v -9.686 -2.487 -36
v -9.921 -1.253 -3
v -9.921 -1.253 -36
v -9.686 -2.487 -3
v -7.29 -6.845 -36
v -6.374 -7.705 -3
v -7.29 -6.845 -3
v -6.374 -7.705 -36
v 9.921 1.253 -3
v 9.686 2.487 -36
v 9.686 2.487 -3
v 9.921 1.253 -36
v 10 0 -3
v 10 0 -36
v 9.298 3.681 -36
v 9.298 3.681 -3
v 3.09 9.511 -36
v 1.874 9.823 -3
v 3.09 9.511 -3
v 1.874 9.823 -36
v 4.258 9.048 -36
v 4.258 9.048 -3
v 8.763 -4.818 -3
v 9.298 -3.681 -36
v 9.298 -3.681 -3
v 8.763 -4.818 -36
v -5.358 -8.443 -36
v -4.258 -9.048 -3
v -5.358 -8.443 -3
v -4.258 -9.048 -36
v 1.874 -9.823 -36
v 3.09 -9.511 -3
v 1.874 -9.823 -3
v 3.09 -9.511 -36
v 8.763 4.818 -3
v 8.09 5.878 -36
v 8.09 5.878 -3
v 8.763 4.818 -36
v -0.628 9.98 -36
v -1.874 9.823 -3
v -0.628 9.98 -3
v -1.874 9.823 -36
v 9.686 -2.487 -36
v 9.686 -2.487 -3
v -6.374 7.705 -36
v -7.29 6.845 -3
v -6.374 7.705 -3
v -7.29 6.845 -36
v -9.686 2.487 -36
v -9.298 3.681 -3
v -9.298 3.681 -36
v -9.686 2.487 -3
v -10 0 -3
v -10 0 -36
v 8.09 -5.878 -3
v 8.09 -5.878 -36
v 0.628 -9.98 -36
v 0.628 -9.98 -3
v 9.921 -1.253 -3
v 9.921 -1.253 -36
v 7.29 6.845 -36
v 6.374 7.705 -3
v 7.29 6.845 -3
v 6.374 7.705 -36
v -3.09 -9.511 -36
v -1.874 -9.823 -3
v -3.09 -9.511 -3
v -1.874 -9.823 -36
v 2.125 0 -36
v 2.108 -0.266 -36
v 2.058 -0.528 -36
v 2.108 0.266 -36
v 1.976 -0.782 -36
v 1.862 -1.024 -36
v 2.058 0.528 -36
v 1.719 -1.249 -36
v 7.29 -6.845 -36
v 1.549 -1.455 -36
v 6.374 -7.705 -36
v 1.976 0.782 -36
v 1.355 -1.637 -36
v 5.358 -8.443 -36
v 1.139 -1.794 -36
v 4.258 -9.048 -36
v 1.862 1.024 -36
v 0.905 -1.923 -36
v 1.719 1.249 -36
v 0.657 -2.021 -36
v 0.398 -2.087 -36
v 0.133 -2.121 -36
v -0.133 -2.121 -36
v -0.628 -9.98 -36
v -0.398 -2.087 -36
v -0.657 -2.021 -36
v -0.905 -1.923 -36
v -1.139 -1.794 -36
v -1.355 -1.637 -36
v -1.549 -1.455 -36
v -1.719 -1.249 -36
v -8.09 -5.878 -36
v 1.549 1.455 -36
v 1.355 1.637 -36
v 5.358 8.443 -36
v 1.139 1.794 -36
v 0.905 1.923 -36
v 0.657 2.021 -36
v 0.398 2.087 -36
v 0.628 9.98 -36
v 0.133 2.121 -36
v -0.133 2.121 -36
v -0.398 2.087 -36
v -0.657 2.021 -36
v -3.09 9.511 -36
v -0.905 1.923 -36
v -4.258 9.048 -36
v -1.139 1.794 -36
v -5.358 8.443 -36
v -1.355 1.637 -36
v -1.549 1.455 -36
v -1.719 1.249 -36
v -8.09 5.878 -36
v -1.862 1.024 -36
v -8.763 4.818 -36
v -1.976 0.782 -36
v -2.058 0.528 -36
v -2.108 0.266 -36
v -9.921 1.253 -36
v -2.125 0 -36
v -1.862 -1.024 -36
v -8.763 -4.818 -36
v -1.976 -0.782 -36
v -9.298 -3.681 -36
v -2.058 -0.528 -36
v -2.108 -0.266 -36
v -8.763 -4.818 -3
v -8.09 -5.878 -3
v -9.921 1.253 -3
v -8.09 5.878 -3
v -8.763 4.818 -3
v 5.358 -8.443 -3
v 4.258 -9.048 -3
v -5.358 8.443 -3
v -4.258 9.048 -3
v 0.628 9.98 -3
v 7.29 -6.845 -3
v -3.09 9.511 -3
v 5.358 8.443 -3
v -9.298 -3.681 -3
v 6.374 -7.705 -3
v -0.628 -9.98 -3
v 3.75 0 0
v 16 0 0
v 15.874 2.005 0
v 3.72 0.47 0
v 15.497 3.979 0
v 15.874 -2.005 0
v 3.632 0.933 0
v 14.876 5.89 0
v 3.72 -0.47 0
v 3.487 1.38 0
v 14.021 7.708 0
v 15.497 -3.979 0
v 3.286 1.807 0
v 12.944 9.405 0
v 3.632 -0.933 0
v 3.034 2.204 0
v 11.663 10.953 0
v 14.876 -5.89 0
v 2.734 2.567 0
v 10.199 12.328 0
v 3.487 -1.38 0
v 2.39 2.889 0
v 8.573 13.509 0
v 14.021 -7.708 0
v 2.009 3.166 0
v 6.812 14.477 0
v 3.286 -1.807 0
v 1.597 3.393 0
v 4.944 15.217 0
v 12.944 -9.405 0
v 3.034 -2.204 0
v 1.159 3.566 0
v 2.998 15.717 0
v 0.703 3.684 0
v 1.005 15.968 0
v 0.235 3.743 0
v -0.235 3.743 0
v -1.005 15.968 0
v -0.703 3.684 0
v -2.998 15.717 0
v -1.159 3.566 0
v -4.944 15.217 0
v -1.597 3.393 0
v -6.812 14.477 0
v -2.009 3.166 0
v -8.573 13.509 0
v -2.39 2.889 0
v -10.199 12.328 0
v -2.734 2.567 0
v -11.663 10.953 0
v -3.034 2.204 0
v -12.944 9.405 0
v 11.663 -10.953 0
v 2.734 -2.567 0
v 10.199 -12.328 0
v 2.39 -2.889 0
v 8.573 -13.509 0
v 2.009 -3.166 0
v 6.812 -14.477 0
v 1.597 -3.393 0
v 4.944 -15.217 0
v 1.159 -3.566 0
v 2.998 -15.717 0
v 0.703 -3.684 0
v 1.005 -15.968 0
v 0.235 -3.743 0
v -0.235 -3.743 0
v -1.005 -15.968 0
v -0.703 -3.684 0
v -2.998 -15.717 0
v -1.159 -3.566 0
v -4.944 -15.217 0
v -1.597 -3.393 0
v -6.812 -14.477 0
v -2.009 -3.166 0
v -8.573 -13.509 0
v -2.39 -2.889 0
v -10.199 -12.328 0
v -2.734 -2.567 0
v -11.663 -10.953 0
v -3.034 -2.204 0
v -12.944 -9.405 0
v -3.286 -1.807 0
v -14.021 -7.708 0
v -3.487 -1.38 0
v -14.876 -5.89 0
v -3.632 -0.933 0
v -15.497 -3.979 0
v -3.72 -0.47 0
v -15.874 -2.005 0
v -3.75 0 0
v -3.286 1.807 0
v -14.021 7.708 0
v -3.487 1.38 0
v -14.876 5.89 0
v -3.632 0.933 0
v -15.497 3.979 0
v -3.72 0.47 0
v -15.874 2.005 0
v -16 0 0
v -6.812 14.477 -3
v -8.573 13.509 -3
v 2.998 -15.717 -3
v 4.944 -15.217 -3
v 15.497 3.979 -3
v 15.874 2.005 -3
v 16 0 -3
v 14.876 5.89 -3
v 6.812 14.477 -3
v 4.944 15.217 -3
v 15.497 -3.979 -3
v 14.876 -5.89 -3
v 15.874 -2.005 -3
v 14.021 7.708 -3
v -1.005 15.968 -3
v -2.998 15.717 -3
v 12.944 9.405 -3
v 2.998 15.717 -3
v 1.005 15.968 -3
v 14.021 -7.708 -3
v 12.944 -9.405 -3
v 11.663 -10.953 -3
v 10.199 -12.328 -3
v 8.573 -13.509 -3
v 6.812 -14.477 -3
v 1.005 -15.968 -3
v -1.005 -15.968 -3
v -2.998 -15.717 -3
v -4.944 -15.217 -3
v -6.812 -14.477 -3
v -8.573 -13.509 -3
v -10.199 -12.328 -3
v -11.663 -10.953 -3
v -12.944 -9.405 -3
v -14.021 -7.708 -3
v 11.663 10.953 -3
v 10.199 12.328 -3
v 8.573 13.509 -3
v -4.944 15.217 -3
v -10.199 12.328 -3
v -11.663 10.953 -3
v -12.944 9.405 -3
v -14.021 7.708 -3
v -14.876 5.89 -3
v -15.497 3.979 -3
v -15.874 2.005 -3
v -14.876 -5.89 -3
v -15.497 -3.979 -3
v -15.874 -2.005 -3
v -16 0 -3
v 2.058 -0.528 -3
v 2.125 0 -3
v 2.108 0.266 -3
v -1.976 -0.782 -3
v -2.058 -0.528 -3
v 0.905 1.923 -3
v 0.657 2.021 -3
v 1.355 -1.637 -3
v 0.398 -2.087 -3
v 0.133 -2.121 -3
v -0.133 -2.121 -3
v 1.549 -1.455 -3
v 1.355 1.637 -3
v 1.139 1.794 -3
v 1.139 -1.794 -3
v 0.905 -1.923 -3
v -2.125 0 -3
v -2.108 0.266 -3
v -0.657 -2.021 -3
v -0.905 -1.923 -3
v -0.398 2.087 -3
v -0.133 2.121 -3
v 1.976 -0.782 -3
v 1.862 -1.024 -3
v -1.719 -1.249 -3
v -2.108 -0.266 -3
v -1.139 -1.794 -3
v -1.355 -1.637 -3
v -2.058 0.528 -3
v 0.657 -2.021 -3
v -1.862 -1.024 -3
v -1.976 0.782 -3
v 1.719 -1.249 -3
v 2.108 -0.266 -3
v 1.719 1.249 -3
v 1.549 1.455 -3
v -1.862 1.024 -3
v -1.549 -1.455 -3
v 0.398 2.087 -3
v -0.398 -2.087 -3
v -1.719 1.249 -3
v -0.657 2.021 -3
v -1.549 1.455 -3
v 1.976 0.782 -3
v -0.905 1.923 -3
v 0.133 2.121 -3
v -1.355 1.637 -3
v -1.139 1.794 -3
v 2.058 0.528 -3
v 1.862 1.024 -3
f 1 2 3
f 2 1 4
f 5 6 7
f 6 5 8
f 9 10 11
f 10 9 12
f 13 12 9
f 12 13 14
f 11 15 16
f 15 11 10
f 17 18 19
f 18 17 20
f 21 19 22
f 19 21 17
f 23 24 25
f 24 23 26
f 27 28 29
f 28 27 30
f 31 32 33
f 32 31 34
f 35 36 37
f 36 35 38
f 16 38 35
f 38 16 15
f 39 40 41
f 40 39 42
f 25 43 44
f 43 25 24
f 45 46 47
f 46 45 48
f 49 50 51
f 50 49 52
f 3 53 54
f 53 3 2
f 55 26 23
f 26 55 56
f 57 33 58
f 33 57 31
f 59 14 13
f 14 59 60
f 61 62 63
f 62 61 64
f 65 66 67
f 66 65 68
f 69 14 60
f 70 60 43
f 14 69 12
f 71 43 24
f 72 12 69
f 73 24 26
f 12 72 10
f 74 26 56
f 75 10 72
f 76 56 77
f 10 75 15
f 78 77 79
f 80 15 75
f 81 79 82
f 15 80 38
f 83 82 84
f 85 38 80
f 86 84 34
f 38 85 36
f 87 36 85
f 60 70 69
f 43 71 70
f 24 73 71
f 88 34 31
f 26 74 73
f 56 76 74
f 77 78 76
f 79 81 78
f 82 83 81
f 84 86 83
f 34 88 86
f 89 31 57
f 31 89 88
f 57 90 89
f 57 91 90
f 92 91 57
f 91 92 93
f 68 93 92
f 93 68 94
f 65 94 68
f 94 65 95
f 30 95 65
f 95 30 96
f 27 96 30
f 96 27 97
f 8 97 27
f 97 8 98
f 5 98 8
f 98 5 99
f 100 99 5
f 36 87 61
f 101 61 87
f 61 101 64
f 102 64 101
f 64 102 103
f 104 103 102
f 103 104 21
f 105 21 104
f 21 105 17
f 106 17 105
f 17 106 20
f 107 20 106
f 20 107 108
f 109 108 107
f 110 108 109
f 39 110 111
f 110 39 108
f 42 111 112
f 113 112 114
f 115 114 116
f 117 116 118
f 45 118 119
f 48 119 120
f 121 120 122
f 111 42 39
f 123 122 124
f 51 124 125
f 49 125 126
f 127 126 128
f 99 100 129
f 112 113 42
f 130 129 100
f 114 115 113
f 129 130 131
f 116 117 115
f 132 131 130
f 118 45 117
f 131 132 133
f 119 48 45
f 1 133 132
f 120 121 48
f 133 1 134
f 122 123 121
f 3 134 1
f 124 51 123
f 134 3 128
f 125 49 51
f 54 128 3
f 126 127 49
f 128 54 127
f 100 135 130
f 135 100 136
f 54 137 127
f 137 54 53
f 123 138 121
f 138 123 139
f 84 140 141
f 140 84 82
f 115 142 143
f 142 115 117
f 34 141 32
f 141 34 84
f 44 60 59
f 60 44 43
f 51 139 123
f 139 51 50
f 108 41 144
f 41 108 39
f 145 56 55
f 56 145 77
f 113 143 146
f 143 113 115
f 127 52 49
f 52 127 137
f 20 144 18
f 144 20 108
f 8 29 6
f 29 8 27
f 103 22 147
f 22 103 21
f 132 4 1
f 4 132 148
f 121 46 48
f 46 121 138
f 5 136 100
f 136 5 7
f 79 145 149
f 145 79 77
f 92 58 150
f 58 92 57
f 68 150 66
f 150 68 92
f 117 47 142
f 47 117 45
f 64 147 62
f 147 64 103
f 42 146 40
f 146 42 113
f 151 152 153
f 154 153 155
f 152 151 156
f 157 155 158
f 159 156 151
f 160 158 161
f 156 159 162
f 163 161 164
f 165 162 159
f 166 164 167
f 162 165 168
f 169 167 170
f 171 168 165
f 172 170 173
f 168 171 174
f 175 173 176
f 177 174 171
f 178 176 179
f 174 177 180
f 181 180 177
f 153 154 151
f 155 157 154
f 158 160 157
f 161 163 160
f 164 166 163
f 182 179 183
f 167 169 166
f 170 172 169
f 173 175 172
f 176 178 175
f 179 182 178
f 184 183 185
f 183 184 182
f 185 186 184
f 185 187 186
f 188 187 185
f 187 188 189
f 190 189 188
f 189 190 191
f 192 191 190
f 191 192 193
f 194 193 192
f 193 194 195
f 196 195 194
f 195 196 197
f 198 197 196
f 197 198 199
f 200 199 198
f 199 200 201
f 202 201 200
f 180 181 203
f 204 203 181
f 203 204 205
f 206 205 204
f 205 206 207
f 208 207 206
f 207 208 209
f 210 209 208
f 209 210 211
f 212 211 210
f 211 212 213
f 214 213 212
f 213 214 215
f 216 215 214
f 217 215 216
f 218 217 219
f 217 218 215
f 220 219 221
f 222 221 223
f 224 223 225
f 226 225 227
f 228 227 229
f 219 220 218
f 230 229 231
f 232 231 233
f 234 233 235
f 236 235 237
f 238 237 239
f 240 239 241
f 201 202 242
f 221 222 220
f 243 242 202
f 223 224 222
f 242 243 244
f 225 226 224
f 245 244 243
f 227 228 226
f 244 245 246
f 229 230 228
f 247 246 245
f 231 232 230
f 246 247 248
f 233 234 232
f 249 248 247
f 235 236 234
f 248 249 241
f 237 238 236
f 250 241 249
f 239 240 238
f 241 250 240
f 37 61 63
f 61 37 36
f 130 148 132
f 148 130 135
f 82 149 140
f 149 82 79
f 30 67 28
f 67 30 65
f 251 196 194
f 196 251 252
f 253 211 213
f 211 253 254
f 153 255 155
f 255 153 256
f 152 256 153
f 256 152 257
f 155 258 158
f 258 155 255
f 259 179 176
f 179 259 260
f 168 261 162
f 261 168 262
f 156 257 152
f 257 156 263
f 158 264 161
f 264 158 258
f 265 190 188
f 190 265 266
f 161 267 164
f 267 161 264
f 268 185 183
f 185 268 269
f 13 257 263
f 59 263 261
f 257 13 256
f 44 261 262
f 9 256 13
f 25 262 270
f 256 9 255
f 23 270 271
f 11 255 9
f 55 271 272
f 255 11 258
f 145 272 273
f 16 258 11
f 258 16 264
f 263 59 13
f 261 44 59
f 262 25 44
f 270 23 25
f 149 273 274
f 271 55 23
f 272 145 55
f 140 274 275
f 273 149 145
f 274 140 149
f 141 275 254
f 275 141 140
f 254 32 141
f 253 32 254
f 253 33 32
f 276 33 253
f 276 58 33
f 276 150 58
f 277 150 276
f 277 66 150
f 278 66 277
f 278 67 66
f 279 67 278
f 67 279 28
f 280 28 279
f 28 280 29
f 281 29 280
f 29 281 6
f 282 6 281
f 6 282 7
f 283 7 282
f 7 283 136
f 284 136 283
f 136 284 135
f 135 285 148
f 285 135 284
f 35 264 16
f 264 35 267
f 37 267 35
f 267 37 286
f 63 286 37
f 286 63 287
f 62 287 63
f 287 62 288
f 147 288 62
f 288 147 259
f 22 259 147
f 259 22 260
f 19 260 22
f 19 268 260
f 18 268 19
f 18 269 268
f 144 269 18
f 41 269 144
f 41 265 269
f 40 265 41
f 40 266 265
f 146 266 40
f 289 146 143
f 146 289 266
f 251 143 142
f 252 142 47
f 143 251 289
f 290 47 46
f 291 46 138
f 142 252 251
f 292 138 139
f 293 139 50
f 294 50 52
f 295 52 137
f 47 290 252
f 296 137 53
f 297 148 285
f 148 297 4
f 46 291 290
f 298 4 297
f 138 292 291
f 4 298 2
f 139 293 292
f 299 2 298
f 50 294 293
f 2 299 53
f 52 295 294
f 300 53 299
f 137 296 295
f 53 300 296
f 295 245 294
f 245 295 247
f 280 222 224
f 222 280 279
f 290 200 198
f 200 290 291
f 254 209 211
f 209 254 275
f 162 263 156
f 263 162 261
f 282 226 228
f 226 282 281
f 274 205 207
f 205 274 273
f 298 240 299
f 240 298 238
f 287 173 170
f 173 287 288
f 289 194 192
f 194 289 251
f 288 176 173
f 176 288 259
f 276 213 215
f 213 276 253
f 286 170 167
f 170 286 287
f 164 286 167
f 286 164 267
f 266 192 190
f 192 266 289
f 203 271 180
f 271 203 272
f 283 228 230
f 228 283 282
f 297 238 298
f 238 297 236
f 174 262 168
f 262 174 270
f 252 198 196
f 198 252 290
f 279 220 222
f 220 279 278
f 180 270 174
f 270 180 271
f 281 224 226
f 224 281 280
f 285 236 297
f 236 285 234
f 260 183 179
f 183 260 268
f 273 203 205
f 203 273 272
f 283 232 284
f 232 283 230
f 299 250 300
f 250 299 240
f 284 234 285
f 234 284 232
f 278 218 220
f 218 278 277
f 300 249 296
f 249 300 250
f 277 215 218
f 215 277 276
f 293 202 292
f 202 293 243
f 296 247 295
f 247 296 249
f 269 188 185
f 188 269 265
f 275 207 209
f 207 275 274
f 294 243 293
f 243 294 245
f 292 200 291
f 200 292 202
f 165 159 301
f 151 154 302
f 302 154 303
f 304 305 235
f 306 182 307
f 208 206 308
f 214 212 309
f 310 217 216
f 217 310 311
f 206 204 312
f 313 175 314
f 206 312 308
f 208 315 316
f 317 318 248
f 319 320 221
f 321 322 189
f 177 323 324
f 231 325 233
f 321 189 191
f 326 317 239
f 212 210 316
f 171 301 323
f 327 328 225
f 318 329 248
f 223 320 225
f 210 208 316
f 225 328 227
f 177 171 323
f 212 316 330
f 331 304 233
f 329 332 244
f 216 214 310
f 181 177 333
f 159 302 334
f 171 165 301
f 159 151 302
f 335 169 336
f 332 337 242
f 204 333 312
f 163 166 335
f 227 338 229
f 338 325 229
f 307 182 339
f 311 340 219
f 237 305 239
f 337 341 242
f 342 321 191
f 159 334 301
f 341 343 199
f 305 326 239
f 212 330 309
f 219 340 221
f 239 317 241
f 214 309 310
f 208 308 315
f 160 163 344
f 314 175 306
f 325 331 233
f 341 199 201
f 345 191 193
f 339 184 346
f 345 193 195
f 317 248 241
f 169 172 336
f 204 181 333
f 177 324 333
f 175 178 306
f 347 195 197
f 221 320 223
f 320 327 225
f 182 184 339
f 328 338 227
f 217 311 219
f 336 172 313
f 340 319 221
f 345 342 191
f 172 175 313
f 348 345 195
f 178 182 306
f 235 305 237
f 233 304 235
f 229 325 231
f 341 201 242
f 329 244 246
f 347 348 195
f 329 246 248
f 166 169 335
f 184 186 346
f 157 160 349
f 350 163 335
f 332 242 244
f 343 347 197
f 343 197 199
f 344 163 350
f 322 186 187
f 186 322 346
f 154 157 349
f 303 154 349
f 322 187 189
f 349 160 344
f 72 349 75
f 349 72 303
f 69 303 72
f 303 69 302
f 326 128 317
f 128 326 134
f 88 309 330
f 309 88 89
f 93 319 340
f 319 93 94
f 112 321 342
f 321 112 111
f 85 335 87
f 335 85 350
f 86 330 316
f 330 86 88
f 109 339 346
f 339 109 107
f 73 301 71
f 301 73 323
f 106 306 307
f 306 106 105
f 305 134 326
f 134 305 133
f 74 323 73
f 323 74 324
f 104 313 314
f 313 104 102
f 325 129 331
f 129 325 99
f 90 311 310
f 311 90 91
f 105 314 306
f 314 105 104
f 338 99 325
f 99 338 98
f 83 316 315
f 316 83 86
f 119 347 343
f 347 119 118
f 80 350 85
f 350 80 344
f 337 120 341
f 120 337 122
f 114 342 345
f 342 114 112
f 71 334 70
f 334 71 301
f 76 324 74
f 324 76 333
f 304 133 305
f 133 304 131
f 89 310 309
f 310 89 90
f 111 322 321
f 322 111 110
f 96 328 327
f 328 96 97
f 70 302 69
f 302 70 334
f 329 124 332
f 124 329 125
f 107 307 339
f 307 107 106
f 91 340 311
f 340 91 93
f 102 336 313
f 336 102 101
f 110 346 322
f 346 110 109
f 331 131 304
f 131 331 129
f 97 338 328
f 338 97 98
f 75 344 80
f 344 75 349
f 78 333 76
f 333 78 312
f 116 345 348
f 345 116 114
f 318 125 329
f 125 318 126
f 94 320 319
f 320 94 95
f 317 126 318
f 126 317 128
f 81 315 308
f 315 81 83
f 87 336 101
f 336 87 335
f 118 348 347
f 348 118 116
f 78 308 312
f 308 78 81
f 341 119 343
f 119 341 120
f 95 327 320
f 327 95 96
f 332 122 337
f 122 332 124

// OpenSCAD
$fn = 50;


difference() {
	union() {
		translate(v = [0, 0, -36.0000000000]) {
			cylinder(h = 36, r = 10.0000000000);
		}
		translate(v = [0, 0, -3.0000000000]) {
			cylinder(h = 3, r = 16.0000000000);
		}
	}
	union() {
		translate(v = [0, 0, 0]) {
			rotate(a = [0, 0, 0]) {
				difference() {
					union() {
						#translate(v = [0, 0, -36.0000000000]) {
							cylinder(h = 36, r = 2.0000000000);
						}
						#translate(v = [0, 0, -3]) {
							cylinder(h = 3, r = 10.0000000000, r1 = 2.1250000000, r2 = 3.7500000000);
						}
						#translate(v = [0, 0, -36.0000000000]) {
							cylinder(h = 36, r = 2.1250000000);
						}
						#translate(v = [0, 0, -36.0000000000]) {
							cylinder(h = 36, r = 2.0000000000);
						}
					}
					union();
				}
			}
		}
	}
}
